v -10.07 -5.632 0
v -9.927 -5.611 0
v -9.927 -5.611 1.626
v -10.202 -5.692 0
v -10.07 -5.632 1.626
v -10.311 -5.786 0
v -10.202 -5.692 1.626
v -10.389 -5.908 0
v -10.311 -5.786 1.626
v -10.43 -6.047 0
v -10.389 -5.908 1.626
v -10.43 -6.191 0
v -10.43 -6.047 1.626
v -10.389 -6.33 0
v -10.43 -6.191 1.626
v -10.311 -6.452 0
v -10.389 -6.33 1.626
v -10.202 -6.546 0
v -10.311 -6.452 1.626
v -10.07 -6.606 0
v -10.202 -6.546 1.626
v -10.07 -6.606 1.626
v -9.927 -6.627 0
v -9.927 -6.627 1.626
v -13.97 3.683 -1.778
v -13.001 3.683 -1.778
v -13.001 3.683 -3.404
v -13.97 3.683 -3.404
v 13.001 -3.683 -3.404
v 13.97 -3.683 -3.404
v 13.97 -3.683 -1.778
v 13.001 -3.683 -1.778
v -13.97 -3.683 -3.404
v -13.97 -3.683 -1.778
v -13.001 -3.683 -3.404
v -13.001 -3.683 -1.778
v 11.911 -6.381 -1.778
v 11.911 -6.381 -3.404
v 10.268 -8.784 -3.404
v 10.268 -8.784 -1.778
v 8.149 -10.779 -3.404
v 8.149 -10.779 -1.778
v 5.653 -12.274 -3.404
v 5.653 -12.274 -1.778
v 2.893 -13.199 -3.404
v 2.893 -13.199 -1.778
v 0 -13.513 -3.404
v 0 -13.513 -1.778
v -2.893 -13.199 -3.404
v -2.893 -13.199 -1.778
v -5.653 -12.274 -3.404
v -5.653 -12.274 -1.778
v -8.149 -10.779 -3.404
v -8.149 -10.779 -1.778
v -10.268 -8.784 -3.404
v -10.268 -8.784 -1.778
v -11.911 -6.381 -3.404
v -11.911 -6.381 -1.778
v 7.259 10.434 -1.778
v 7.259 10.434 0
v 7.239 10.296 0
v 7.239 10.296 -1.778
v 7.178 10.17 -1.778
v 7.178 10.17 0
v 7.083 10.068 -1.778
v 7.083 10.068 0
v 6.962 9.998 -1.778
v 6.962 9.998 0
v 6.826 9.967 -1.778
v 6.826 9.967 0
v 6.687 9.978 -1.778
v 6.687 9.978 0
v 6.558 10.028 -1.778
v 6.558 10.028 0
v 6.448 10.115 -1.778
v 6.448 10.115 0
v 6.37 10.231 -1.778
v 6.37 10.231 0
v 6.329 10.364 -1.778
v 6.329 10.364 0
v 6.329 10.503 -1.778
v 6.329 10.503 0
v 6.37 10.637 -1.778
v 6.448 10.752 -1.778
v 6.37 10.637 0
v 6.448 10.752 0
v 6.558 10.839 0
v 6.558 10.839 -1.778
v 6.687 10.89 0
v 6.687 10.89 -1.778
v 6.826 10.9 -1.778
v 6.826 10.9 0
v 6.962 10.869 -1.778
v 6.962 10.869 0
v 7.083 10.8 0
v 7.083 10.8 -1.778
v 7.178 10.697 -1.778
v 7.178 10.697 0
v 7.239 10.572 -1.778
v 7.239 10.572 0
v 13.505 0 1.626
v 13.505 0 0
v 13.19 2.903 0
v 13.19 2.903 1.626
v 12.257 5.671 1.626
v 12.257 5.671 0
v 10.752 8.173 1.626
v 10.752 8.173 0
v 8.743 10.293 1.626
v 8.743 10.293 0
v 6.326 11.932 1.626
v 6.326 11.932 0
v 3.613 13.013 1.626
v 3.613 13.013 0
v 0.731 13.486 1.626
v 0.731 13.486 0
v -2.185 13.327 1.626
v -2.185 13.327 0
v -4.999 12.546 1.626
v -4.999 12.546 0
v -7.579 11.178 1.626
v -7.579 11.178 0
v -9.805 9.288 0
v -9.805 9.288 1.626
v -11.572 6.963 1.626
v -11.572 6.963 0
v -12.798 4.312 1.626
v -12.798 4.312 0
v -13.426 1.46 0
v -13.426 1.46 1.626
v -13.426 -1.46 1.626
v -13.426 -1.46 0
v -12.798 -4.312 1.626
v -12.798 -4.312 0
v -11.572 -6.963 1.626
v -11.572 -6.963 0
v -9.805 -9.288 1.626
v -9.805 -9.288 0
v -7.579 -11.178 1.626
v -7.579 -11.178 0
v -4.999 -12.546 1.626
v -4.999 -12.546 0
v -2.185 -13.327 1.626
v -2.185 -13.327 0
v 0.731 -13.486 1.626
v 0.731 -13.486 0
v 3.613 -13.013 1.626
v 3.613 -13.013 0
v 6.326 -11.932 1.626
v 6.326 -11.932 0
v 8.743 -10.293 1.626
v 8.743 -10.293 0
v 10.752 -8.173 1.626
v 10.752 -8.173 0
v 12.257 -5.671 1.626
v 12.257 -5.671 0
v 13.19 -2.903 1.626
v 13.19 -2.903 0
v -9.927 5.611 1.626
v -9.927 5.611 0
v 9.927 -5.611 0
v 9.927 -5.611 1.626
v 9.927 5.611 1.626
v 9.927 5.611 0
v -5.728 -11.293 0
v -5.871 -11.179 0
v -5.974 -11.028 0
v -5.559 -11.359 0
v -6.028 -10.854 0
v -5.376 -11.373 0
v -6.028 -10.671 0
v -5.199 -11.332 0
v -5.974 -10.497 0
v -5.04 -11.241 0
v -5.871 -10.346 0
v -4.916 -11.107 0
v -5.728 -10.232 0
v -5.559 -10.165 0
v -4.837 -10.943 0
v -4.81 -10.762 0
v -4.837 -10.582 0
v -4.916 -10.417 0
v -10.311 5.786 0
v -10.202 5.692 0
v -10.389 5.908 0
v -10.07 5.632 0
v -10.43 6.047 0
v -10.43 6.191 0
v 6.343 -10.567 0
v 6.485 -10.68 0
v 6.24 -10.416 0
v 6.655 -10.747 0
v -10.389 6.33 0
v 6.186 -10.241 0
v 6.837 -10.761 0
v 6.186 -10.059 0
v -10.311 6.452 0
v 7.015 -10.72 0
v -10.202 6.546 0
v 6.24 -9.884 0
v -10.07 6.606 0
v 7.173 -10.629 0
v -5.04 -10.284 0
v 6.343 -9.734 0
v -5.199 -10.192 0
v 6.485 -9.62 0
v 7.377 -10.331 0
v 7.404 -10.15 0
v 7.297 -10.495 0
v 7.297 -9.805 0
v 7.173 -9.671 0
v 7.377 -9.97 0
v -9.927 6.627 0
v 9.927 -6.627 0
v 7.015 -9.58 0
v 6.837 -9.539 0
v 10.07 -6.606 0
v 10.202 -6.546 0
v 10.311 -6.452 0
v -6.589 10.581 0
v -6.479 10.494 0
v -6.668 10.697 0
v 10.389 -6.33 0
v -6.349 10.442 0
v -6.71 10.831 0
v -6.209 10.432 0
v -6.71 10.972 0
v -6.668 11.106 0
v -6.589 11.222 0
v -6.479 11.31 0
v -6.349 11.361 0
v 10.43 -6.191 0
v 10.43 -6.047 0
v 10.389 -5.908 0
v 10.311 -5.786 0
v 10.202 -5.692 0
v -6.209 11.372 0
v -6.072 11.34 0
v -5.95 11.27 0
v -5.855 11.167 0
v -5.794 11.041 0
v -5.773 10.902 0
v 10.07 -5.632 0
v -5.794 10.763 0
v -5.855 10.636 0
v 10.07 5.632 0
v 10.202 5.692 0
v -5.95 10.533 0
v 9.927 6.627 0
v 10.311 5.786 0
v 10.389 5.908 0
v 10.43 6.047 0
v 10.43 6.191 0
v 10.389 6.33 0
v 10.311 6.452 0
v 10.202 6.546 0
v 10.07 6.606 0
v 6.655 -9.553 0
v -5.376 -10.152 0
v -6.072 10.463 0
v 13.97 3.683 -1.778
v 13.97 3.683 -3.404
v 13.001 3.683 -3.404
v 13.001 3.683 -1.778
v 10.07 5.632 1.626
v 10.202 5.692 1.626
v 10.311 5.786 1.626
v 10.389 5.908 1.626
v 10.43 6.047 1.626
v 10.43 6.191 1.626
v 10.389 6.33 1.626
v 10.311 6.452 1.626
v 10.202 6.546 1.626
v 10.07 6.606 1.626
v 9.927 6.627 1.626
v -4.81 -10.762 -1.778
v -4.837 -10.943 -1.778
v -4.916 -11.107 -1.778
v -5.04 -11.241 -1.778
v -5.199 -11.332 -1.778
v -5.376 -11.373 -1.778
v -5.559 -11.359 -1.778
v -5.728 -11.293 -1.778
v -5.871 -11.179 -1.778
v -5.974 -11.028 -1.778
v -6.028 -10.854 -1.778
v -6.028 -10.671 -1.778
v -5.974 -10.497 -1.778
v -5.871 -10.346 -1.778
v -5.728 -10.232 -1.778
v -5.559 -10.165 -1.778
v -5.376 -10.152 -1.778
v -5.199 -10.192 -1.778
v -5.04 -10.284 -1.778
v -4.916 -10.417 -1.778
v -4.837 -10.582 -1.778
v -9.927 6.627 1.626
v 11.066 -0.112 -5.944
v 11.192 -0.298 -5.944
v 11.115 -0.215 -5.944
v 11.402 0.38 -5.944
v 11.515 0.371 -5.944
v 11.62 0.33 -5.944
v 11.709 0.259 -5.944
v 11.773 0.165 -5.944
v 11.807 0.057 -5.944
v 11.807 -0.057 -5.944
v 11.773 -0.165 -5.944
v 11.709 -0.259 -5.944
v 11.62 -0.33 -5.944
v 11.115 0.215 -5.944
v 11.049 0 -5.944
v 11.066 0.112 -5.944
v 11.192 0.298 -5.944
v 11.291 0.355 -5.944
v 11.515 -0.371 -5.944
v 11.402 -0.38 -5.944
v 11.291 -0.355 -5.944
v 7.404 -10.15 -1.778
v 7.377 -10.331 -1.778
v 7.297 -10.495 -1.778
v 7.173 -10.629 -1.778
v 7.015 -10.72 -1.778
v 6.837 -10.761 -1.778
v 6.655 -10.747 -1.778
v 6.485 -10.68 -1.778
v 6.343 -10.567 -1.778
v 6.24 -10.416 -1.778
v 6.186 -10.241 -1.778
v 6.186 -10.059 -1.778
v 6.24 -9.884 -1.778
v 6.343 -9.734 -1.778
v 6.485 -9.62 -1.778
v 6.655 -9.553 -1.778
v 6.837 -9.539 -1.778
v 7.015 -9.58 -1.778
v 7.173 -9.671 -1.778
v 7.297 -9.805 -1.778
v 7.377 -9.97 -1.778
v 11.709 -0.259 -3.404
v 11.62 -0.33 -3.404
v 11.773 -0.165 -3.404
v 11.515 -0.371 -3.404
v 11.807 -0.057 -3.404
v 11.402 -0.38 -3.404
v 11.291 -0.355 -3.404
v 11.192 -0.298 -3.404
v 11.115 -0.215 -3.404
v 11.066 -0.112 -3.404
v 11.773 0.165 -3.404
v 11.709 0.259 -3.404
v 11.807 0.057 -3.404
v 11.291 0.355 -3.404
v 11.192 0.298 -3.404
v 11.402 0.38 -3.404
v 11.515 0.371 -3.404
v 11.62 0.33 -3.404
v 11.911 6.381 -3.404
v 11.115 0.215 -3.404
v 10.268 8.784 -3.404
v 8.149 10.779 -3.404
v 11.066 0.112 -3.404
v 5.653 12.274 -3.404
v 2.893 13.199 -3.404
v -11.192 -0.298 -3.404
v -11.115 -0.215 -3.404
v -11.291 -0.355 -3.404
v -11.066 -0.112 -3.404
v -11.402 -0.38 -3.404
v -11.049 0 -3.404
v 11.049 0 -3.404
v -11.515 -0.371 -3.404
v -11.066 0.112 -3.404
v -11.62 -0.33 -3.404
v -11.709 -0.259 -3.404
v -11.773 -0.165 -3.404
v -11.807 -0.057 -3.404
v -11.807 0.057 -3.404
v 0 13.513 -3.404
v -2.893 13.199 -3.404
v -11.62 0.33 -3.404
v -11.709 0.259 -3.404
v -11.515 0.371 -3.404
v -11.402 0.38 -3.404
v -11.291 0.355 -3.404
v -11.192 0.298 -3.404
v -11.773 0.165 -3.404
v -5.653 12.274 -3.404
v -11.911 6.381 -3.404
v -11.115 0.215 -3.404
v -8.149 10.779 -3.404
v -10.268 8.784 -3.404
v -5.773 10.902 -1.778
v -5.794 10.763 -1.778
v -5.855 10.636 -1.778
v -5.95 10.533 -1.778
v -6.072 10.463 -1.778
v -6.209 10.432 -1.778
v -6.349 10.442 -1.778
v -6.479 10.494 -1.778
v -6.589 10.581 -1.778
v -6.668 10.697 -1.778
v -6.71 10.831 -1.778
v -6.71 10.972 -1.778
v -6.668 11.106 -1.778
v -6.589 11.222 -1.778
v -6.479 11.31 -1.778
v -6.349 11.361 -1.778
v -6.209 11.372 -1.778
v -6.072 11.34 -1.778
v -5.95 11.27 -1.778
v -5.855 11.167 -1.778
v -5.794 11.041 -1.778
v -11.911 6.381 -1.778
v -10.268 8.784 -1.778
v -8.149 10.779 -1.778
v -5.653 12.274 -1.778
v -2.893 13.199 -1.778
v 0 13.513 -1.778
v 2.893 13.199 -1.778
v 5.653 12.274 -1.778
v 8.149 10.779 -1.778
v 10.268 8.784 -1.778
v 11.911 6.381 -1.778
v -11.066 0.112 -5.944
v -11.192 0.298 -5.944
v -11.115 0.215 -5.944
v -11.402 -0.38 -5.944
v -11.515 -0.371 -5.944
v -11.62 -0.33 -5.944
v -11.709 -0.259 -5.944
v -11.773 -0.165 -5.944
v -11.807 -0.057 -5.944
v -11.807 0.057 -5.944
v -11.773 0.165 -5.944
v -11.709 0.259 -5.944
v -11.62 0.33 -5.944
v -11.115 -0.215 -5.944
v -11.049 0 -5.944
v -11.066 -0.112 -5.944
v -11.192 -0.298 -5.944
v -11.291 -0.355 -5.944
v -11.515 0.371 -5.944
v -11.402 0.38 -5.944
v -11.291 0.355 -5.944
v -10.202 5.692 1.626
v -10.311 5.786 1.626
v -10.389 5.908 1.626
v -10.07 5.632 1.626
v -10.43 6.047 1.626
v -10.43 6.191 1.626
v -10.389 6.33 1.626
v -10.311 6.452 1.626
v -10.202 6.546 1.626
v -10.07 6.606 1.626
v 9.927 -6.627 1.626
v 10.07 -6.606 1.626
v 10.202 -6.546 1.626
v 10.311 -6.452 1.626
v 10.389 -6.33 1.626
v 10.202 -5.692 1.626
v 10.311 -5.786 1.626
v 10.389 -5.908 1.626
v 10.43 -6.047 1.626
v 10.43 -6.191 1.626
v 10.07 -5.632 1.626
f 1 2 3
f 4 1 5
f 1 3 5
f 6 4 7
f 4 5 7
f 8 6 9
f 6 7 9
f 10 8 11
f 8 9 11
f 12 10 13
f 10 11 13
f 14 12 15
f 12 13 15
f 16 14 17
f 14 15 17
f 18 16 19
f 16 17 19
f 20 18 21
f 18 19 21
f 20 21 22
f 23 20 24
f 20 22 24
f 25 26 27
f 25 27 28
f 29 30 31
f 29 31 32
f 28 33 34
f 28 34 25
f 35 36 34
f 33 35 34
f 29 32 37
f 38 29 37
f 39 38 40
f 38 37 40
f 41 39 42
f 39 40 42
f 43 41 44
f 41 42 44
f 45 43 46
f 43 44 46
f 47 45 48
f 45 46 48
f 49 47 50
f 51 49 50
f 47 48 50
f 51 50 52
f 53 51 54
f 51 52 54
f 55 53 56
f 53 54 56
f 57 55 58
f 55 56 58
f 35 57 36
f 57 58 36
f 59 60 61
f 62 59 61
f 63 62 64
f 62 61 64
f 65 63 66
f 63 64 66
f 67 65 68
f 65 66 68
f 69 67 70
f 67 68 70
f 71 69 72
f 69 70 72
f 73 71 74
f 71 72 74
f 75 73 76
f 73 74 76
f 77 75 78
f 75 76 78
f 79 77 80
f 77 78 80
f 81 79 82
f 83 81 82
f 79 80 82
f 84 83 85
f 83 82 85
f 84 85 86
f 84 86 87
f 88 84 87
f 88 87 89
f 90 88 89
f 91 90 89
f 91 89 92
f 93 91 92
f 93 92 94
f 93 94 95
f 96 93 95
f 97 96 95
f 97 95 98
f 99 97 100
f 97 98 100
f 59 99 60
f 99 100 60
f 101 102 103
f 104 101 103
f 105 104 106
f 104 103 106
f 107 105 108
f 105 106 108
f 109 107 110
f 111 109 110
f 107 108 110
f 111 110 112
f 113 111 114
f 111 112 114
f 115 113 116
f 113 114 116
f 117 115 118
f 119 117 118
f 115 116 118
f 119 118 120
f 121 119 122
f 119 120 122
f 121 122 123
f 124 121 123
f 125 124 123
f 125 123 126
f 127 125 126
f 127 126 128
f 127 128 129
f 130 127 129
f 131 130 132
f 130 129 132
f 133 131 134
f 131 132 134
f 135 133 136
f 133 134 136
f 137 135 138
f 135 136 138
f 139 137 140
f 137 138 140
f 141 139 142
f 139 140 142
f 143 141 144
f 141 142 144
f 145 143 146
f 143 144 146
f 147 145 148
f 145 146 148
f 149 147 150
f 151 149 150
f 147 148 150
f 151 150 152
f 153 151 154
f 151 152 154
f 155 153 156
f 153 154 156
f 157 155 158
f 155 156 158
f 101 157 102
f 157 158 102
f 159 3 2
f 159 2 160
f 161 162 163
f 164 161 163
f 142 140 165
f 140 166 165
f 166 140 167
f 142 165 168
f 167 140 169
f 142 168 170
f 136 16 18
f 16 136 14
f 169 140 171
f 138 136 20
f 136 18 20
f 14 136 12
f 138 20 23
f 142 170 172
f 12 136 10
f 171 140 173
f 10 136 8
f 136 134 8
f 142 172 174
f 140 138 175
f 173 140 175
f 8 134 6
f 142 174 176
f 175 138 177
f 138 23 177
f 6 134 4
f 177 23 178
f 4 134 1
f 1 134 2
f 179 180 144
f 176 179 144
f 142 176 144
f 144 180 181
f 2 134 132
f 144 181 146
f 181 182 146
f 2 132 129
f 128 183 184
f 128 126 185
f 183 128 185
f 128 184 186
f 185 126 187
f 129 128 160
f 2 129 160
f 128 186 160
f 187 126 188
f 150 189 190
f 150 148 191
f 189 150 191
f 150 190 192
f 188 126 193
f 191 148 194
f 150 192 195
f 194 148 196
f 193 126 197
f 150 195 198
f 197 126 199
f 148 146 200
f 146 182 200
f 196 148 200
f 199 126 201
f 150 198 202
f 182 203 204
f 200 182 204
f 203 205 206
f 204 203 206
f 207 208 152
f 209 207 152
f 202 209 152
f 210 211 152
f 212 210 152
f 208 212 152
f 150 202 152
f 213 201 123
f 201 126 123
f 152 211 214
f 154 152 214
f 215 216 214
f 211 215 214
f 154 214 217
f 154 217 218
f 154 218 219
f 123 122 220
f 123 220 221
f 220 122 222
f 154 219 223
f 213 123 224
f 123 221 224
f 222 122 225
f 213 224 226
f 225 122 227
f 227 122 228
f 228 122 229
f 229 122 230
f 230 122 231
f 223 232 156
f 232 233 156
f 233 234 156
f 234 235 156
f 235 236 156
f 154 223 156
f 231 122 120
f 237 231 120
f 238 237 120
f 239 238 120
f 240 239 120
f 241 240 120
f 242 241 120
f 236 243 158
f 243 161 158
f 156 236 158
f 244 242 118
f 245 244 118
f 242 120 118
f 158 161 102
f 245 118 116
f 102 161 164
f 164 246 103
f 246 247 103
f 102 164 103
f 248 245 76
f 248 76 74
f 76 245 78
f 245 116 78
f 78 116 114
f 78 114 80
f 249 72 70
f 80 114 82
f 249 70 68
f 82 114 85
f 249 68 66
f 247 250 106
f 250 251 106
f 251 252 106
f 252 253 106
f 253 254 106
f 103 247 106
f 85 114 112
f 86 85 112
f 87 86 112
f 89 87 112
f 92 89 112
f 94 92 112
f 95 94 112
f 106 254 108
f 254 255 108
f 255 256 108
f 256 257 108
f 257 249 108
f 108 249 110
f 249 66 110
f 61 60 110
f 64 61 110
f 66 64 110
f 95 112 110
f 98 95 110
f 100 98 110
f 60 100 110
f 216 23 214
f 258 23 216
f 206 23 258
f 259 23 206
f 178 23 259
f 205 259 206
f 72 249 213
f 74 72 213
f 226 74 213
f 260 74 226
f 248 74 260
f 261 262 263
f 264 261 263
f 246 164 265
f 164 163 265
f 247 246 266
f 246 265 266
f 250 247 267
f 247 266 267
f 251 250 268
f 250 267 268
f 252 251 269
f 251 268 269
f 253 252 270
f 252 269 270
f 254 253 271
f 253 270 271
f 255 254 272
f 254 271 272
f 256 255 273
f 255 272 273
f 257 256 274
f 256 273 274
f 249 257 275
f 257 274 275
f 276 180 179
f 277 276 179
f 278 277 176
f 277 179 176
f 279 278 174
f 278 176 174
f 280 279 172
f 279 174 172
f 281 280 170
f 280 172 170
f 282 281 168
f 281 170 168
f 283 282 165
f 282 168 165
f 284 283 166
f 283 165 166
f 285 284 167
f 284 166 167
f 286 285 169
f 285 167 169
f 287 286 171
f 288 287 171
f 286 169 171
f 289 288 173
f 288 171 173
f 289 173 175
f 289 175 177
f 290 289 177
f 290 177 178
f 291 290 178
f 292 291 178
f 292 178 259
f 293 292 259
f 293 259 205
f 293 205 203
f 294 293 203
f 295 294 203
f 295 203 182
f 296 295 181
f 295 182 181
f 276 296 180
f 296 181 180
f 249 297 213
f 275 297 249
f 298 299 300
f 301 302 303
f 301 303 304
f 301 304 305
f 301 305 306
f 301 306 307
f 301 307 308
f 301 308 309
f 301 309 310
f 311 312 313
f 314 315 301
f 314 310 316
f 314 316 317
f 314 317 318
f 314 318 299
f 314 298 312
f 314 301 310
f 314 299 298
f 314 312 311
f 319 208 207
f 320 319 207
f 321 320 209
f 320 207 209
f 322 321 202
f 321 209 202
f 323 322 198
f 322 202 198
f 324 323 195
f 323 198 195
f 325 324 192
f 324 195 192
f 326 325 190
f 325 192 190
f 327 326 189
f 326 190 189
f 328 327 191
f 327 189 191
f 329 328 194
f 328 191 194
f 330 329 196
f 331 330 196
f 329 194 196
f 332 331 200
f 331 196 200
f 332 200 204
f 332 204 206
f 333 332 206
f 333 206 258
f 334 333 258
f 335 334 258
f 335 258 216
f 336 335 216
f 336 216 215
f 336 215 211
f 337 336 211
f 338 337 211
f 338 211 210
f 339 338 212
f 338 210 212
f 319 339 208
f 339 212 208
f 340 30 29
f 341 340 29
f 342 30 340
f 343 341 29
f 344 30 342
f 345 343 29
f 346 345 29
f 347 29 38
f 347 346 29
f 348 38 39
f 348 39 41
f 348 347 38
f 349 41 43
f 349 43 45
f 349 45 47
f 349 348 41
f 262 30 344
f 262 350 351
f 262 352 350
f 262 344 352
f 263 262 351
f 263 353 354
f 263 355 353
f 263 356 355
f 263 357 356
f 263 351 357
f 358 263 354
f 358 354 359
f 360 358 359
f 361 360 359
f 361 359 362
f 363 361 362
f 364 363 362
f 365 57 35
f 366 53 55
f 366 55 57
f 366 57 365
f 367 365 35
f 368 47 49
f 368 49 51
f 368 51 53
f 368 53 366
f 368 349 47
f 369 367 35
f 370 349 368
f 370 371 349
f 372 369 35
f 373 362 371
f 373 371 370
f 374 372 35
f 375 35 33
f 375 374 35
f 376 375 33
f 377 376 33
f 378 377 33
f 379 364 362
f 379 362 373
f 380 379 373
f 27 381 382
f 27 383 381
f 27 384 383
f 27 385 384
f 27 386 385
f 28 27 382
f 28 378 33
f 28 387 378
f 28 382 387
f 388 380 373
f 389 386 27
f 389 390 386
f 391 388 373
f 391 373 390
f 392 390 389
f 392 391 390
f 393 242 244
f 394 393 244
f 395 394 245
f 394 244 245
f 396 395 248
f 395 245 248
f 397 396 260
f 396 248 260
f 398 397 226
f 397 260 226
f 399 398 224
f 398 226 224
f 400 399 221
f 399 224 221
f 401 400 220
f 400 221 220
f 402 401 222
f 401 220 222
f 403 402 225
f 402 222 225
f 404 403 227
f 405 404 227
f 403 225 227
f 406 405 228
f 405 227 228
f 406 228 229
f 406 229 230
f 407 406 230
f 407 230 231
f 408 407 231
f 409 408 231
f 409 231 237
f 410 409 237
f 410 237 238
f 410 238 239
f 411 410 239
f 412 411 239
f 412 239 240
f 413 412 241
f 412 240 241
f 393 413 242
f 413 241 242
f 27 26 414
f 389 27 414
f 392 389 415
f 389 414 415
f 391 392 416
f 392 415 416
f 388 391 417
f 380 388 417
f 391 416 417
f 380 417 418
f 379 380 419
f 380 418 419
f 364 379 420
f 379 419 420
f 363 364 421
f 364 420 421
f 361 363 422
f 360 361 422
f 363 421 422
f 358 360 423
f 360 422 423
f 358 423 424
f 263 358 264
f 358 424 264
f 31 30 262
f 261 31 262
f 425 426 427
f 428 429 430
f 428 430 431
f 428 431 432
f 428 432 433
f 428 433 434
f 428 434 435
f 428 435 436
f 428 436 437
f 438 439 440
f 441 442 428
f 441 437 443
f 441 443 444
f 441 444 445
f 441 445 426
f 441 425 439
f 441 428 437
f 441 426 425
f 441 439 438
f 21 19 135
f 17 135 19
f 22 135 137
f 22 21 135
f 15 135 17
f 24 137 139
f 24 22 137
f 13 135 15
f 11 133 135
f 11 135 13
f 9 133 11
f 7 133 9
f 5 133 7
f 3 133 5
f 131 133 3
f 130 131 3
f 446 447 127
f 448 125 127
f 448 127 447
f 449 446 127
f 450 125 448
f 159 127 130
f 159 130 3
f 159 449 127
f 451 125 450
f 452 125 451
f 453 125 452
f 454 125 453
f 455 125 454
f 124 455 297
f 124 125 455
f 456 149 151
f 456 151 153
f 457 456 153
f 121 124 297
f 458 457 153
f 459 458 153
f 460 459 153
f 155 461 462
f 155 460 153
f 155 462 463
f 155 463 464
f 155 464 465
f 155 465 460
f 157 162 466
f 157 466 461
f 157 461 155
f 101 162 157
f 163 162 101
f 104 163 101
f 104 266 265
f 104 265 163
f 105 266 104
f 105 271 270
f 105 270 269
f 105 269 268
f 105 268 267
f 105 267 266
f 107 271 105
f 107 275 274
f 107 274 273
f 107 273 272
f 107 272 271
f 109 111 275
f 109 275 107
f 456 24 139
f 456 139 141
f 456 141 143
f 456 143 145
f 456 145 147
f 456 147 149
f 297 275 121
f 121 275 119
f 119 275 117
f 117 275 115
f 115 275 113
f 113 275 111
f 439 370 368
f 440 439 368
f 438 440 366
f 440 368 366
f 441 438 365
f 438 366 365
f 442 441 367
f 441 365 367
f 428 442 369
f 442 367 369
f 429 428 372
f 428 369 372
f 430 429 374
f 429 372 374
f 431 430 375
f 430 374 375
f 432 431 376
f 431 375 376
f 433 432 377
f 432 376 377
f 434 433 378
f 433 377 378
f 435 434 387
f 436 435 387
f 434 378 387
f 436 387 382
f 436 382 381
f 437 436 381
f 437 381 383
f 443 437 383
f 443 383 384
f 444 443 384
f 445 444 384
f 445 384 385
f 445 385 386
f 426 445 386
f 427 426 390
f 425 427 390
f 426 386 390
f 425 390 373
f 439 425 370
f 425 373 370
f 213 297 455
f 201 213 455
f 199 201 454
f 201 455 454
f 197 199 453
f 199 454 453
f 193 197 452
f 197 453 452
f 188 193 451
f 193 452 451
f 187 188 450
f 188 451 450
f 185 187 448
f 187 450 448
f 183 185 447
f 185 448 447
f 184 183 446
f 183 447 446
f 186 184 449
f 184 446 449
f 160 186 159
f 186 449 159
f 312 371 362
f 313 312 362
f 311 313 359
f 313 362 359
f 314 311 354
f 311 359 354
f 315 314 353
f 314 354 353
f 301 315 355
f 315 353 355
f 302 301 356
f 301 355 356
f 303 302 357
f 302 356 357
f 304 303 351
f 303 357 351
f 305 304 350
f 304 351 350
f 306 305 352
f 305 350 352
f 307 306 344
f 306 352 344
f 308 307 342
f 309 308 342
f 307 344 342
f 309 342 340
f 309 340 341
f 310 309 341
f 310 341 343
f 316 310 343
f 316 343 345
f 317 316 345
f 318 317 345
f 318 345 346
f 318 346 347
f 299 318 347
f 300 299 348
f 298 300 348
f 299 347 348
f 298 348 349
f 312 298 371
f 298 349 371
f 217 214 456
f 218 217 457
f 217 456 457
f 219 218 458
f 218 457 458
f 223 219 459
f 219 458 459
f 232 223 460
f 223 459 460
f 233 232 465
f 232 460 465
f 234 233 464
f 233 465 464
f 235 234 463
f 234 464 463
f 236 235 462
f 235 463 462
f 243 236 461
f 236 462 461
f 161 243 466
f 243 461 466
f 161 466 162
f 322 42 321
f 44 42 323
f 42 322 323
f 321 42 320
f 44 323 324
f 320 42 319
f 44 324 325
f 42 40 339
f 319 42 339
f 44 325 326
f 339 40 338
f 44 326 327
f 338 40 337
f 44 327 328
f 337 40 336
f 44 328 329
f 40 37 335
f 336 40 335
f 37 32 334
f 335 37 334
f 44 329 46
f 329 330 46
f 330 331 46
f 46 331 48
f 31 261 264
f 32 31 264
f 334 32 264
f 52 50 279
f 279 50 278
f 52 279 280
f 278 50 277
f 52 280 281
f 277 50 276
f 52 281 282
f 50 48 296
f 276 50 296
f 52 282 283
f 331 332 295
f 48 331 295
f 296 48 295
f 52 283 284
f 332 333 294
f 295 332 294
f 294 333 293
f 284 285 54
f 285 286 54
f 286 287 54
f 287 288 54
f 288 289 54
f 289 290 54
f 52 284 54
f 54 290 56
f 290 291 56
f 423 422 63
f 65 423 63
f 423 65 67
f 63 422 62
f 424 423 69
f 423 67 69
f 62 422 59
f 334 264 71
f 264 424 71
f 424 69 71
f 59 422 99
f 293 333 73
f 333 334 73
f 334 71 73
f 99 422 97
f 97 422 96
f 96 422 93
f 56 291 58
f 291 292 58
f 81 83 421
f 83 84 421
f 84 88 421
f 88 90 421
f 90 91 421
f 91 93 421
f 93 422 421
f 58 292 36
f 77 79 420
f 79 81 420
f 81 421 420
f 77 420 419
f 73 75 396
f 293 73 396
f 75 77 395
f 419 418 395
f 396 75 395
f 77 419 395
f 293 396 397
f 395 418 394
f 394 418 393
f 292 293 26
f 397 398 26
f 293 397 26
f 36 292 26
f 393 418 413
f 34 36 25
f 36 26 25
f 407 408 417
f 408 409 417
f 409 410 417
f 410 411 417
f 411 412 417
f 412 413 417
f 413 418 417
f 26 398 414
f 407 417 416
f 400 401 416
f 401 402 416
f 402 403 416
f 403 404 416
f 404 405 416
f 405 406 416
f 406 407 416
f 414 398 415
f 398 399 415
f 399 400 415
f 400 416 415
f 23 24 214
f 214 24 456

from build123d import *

# Parameters (mm, degrees)
SKETCH5_R           = 13.505404748
BOSS_EXTRUDE1_DEPTH = 1.6256
SKETCH6_W           = 19.854
SKETCH6_H           = 13.254
CUT_EXTRUDE1_DEPTH  = 20.168580808
SKETCH7_R           = 0.508
CUT_EXTRUDE2_DEPTH  = 20.168580808
SKETCH9_R           = 0.467957387
SKETCH9_R_2         = 0.471151672
SKETCH9_R_3         = 0.612350227
BOSS_EXTRUDE2_DEPTH = 1.778
SKETCH10_R          = 13.5128
BOSS_EXTRUDE3_DEPTH = 1.6256
SKETCH11_W          = 27.94
SKETCH11_H          = 7.366
BOSS_EXTRUDE4_DEPTH = 1.6256
SKETCH12_R          = 0.381
BOSS_EXTRUDE5_DEPTH = 2.54


with BuildPart() as part:
    # Sketch5 → Boss-Extrude1 (new body)
    with BuildSketch(Plane.XY):
        Circle(SKETCH5_R)
    extrude(amount=BOSS_EXTRUDE1_DEPTH)

    # Sketch6 → Cut-Extrude1 (cut, through all)
    with BuildSketch(Plane.XY.offset(1.6256)):
        Rectangle(SKETCH6_W, SKETCH6_H)
    extrude(amount=-CUT_EXTRUDE1_DEPTH, mode=Mode.SUBTRACT)

    # Sketch7 → Cut-Extrude2 (cut, through all)
    with BuildSketch(Plane.XY.offset(1.6256)):
        with Locations((-9.927, 6.119)):
            Circle(SKETCH7_R)
        with Locations((-9.927, -6.119)):
            Circle(SKETCH7_R)
        with Locations((9.927, -6.119)):
            Circle(SKETCH7_R)
        with Locations((9.927, 6.119)):
            Circle(SKETCH7_R)
    extrude(amount=-CUT_EXTRUDE2_DEPTH, mode=Mode.SUBTRACT)

    # Sketch9 → Boss-Extrude2 (add)
    with BuildSketch(Plane(origin=(0, 0, 0), x_dir=(-1, 0, 0), z_dir=(0, 0, -1))):
        with Locations(Location((-6.791513401, 10.433736314, 0), (0, 0, 180))):
            Circle(SKETCH9_R)
        with Locations(Location((6.243810708, 10.901693701, 0), (0, 0, 180))):
            Circle(SKETCH9_R_2)
        with Locations(Location((5.422256667, -10.76235793, 0), (0, 0, 180))):
            Circle(SKETCH9_R_3)
        with Locations(Location((-6.791513401, -10.150007703, 0), (0, 0, 180))):
            Circle(SKETCH9_R_3)
    extrude(amount=BOSS_EXTRUDE2_DEPTH)

    # Sketch10 → Boss-Extrude3 (add)
    with BuildSketch(Plane(origin=(0, 0, -1.778), x_dir=(-1, 0, 0), z_dir=(0, 0, -1))):
        Circle(SKETCH10_R)
    extrude(amount=BOSS_EXTRUDE3_DEPTH)

    # Sketch11 → Boss-Extrude4 (add)
    with BuildSketch(Plane(origin=(0, 0, -3.4036), x_dir=(-1, 0, 0), z_dir=(0, 0, -1))):
        Rectangle(SKETCH11_W, SKETCH11_H)
    extrude(amount=-BOSS_EXTRUDE4_DEPTH)

    # Sketch12 → Boss-Extrude5 (add)
    with BuildSketch(Plane(origin=(0, 0, -3.4036), x_dir=(-1, 0, 0), z_dir=(0, 0, -1))):
        with Locations((-11.43, 0)):
            Circle(SKETCH12_R)
        with Locations(Location((11.43, 0, 0), (0, 0, 180))):
            Circle(SKETCH12_R)
    extrude(amount=BOSS_EXTRUDE5_DEPTH)


solid = part.part
